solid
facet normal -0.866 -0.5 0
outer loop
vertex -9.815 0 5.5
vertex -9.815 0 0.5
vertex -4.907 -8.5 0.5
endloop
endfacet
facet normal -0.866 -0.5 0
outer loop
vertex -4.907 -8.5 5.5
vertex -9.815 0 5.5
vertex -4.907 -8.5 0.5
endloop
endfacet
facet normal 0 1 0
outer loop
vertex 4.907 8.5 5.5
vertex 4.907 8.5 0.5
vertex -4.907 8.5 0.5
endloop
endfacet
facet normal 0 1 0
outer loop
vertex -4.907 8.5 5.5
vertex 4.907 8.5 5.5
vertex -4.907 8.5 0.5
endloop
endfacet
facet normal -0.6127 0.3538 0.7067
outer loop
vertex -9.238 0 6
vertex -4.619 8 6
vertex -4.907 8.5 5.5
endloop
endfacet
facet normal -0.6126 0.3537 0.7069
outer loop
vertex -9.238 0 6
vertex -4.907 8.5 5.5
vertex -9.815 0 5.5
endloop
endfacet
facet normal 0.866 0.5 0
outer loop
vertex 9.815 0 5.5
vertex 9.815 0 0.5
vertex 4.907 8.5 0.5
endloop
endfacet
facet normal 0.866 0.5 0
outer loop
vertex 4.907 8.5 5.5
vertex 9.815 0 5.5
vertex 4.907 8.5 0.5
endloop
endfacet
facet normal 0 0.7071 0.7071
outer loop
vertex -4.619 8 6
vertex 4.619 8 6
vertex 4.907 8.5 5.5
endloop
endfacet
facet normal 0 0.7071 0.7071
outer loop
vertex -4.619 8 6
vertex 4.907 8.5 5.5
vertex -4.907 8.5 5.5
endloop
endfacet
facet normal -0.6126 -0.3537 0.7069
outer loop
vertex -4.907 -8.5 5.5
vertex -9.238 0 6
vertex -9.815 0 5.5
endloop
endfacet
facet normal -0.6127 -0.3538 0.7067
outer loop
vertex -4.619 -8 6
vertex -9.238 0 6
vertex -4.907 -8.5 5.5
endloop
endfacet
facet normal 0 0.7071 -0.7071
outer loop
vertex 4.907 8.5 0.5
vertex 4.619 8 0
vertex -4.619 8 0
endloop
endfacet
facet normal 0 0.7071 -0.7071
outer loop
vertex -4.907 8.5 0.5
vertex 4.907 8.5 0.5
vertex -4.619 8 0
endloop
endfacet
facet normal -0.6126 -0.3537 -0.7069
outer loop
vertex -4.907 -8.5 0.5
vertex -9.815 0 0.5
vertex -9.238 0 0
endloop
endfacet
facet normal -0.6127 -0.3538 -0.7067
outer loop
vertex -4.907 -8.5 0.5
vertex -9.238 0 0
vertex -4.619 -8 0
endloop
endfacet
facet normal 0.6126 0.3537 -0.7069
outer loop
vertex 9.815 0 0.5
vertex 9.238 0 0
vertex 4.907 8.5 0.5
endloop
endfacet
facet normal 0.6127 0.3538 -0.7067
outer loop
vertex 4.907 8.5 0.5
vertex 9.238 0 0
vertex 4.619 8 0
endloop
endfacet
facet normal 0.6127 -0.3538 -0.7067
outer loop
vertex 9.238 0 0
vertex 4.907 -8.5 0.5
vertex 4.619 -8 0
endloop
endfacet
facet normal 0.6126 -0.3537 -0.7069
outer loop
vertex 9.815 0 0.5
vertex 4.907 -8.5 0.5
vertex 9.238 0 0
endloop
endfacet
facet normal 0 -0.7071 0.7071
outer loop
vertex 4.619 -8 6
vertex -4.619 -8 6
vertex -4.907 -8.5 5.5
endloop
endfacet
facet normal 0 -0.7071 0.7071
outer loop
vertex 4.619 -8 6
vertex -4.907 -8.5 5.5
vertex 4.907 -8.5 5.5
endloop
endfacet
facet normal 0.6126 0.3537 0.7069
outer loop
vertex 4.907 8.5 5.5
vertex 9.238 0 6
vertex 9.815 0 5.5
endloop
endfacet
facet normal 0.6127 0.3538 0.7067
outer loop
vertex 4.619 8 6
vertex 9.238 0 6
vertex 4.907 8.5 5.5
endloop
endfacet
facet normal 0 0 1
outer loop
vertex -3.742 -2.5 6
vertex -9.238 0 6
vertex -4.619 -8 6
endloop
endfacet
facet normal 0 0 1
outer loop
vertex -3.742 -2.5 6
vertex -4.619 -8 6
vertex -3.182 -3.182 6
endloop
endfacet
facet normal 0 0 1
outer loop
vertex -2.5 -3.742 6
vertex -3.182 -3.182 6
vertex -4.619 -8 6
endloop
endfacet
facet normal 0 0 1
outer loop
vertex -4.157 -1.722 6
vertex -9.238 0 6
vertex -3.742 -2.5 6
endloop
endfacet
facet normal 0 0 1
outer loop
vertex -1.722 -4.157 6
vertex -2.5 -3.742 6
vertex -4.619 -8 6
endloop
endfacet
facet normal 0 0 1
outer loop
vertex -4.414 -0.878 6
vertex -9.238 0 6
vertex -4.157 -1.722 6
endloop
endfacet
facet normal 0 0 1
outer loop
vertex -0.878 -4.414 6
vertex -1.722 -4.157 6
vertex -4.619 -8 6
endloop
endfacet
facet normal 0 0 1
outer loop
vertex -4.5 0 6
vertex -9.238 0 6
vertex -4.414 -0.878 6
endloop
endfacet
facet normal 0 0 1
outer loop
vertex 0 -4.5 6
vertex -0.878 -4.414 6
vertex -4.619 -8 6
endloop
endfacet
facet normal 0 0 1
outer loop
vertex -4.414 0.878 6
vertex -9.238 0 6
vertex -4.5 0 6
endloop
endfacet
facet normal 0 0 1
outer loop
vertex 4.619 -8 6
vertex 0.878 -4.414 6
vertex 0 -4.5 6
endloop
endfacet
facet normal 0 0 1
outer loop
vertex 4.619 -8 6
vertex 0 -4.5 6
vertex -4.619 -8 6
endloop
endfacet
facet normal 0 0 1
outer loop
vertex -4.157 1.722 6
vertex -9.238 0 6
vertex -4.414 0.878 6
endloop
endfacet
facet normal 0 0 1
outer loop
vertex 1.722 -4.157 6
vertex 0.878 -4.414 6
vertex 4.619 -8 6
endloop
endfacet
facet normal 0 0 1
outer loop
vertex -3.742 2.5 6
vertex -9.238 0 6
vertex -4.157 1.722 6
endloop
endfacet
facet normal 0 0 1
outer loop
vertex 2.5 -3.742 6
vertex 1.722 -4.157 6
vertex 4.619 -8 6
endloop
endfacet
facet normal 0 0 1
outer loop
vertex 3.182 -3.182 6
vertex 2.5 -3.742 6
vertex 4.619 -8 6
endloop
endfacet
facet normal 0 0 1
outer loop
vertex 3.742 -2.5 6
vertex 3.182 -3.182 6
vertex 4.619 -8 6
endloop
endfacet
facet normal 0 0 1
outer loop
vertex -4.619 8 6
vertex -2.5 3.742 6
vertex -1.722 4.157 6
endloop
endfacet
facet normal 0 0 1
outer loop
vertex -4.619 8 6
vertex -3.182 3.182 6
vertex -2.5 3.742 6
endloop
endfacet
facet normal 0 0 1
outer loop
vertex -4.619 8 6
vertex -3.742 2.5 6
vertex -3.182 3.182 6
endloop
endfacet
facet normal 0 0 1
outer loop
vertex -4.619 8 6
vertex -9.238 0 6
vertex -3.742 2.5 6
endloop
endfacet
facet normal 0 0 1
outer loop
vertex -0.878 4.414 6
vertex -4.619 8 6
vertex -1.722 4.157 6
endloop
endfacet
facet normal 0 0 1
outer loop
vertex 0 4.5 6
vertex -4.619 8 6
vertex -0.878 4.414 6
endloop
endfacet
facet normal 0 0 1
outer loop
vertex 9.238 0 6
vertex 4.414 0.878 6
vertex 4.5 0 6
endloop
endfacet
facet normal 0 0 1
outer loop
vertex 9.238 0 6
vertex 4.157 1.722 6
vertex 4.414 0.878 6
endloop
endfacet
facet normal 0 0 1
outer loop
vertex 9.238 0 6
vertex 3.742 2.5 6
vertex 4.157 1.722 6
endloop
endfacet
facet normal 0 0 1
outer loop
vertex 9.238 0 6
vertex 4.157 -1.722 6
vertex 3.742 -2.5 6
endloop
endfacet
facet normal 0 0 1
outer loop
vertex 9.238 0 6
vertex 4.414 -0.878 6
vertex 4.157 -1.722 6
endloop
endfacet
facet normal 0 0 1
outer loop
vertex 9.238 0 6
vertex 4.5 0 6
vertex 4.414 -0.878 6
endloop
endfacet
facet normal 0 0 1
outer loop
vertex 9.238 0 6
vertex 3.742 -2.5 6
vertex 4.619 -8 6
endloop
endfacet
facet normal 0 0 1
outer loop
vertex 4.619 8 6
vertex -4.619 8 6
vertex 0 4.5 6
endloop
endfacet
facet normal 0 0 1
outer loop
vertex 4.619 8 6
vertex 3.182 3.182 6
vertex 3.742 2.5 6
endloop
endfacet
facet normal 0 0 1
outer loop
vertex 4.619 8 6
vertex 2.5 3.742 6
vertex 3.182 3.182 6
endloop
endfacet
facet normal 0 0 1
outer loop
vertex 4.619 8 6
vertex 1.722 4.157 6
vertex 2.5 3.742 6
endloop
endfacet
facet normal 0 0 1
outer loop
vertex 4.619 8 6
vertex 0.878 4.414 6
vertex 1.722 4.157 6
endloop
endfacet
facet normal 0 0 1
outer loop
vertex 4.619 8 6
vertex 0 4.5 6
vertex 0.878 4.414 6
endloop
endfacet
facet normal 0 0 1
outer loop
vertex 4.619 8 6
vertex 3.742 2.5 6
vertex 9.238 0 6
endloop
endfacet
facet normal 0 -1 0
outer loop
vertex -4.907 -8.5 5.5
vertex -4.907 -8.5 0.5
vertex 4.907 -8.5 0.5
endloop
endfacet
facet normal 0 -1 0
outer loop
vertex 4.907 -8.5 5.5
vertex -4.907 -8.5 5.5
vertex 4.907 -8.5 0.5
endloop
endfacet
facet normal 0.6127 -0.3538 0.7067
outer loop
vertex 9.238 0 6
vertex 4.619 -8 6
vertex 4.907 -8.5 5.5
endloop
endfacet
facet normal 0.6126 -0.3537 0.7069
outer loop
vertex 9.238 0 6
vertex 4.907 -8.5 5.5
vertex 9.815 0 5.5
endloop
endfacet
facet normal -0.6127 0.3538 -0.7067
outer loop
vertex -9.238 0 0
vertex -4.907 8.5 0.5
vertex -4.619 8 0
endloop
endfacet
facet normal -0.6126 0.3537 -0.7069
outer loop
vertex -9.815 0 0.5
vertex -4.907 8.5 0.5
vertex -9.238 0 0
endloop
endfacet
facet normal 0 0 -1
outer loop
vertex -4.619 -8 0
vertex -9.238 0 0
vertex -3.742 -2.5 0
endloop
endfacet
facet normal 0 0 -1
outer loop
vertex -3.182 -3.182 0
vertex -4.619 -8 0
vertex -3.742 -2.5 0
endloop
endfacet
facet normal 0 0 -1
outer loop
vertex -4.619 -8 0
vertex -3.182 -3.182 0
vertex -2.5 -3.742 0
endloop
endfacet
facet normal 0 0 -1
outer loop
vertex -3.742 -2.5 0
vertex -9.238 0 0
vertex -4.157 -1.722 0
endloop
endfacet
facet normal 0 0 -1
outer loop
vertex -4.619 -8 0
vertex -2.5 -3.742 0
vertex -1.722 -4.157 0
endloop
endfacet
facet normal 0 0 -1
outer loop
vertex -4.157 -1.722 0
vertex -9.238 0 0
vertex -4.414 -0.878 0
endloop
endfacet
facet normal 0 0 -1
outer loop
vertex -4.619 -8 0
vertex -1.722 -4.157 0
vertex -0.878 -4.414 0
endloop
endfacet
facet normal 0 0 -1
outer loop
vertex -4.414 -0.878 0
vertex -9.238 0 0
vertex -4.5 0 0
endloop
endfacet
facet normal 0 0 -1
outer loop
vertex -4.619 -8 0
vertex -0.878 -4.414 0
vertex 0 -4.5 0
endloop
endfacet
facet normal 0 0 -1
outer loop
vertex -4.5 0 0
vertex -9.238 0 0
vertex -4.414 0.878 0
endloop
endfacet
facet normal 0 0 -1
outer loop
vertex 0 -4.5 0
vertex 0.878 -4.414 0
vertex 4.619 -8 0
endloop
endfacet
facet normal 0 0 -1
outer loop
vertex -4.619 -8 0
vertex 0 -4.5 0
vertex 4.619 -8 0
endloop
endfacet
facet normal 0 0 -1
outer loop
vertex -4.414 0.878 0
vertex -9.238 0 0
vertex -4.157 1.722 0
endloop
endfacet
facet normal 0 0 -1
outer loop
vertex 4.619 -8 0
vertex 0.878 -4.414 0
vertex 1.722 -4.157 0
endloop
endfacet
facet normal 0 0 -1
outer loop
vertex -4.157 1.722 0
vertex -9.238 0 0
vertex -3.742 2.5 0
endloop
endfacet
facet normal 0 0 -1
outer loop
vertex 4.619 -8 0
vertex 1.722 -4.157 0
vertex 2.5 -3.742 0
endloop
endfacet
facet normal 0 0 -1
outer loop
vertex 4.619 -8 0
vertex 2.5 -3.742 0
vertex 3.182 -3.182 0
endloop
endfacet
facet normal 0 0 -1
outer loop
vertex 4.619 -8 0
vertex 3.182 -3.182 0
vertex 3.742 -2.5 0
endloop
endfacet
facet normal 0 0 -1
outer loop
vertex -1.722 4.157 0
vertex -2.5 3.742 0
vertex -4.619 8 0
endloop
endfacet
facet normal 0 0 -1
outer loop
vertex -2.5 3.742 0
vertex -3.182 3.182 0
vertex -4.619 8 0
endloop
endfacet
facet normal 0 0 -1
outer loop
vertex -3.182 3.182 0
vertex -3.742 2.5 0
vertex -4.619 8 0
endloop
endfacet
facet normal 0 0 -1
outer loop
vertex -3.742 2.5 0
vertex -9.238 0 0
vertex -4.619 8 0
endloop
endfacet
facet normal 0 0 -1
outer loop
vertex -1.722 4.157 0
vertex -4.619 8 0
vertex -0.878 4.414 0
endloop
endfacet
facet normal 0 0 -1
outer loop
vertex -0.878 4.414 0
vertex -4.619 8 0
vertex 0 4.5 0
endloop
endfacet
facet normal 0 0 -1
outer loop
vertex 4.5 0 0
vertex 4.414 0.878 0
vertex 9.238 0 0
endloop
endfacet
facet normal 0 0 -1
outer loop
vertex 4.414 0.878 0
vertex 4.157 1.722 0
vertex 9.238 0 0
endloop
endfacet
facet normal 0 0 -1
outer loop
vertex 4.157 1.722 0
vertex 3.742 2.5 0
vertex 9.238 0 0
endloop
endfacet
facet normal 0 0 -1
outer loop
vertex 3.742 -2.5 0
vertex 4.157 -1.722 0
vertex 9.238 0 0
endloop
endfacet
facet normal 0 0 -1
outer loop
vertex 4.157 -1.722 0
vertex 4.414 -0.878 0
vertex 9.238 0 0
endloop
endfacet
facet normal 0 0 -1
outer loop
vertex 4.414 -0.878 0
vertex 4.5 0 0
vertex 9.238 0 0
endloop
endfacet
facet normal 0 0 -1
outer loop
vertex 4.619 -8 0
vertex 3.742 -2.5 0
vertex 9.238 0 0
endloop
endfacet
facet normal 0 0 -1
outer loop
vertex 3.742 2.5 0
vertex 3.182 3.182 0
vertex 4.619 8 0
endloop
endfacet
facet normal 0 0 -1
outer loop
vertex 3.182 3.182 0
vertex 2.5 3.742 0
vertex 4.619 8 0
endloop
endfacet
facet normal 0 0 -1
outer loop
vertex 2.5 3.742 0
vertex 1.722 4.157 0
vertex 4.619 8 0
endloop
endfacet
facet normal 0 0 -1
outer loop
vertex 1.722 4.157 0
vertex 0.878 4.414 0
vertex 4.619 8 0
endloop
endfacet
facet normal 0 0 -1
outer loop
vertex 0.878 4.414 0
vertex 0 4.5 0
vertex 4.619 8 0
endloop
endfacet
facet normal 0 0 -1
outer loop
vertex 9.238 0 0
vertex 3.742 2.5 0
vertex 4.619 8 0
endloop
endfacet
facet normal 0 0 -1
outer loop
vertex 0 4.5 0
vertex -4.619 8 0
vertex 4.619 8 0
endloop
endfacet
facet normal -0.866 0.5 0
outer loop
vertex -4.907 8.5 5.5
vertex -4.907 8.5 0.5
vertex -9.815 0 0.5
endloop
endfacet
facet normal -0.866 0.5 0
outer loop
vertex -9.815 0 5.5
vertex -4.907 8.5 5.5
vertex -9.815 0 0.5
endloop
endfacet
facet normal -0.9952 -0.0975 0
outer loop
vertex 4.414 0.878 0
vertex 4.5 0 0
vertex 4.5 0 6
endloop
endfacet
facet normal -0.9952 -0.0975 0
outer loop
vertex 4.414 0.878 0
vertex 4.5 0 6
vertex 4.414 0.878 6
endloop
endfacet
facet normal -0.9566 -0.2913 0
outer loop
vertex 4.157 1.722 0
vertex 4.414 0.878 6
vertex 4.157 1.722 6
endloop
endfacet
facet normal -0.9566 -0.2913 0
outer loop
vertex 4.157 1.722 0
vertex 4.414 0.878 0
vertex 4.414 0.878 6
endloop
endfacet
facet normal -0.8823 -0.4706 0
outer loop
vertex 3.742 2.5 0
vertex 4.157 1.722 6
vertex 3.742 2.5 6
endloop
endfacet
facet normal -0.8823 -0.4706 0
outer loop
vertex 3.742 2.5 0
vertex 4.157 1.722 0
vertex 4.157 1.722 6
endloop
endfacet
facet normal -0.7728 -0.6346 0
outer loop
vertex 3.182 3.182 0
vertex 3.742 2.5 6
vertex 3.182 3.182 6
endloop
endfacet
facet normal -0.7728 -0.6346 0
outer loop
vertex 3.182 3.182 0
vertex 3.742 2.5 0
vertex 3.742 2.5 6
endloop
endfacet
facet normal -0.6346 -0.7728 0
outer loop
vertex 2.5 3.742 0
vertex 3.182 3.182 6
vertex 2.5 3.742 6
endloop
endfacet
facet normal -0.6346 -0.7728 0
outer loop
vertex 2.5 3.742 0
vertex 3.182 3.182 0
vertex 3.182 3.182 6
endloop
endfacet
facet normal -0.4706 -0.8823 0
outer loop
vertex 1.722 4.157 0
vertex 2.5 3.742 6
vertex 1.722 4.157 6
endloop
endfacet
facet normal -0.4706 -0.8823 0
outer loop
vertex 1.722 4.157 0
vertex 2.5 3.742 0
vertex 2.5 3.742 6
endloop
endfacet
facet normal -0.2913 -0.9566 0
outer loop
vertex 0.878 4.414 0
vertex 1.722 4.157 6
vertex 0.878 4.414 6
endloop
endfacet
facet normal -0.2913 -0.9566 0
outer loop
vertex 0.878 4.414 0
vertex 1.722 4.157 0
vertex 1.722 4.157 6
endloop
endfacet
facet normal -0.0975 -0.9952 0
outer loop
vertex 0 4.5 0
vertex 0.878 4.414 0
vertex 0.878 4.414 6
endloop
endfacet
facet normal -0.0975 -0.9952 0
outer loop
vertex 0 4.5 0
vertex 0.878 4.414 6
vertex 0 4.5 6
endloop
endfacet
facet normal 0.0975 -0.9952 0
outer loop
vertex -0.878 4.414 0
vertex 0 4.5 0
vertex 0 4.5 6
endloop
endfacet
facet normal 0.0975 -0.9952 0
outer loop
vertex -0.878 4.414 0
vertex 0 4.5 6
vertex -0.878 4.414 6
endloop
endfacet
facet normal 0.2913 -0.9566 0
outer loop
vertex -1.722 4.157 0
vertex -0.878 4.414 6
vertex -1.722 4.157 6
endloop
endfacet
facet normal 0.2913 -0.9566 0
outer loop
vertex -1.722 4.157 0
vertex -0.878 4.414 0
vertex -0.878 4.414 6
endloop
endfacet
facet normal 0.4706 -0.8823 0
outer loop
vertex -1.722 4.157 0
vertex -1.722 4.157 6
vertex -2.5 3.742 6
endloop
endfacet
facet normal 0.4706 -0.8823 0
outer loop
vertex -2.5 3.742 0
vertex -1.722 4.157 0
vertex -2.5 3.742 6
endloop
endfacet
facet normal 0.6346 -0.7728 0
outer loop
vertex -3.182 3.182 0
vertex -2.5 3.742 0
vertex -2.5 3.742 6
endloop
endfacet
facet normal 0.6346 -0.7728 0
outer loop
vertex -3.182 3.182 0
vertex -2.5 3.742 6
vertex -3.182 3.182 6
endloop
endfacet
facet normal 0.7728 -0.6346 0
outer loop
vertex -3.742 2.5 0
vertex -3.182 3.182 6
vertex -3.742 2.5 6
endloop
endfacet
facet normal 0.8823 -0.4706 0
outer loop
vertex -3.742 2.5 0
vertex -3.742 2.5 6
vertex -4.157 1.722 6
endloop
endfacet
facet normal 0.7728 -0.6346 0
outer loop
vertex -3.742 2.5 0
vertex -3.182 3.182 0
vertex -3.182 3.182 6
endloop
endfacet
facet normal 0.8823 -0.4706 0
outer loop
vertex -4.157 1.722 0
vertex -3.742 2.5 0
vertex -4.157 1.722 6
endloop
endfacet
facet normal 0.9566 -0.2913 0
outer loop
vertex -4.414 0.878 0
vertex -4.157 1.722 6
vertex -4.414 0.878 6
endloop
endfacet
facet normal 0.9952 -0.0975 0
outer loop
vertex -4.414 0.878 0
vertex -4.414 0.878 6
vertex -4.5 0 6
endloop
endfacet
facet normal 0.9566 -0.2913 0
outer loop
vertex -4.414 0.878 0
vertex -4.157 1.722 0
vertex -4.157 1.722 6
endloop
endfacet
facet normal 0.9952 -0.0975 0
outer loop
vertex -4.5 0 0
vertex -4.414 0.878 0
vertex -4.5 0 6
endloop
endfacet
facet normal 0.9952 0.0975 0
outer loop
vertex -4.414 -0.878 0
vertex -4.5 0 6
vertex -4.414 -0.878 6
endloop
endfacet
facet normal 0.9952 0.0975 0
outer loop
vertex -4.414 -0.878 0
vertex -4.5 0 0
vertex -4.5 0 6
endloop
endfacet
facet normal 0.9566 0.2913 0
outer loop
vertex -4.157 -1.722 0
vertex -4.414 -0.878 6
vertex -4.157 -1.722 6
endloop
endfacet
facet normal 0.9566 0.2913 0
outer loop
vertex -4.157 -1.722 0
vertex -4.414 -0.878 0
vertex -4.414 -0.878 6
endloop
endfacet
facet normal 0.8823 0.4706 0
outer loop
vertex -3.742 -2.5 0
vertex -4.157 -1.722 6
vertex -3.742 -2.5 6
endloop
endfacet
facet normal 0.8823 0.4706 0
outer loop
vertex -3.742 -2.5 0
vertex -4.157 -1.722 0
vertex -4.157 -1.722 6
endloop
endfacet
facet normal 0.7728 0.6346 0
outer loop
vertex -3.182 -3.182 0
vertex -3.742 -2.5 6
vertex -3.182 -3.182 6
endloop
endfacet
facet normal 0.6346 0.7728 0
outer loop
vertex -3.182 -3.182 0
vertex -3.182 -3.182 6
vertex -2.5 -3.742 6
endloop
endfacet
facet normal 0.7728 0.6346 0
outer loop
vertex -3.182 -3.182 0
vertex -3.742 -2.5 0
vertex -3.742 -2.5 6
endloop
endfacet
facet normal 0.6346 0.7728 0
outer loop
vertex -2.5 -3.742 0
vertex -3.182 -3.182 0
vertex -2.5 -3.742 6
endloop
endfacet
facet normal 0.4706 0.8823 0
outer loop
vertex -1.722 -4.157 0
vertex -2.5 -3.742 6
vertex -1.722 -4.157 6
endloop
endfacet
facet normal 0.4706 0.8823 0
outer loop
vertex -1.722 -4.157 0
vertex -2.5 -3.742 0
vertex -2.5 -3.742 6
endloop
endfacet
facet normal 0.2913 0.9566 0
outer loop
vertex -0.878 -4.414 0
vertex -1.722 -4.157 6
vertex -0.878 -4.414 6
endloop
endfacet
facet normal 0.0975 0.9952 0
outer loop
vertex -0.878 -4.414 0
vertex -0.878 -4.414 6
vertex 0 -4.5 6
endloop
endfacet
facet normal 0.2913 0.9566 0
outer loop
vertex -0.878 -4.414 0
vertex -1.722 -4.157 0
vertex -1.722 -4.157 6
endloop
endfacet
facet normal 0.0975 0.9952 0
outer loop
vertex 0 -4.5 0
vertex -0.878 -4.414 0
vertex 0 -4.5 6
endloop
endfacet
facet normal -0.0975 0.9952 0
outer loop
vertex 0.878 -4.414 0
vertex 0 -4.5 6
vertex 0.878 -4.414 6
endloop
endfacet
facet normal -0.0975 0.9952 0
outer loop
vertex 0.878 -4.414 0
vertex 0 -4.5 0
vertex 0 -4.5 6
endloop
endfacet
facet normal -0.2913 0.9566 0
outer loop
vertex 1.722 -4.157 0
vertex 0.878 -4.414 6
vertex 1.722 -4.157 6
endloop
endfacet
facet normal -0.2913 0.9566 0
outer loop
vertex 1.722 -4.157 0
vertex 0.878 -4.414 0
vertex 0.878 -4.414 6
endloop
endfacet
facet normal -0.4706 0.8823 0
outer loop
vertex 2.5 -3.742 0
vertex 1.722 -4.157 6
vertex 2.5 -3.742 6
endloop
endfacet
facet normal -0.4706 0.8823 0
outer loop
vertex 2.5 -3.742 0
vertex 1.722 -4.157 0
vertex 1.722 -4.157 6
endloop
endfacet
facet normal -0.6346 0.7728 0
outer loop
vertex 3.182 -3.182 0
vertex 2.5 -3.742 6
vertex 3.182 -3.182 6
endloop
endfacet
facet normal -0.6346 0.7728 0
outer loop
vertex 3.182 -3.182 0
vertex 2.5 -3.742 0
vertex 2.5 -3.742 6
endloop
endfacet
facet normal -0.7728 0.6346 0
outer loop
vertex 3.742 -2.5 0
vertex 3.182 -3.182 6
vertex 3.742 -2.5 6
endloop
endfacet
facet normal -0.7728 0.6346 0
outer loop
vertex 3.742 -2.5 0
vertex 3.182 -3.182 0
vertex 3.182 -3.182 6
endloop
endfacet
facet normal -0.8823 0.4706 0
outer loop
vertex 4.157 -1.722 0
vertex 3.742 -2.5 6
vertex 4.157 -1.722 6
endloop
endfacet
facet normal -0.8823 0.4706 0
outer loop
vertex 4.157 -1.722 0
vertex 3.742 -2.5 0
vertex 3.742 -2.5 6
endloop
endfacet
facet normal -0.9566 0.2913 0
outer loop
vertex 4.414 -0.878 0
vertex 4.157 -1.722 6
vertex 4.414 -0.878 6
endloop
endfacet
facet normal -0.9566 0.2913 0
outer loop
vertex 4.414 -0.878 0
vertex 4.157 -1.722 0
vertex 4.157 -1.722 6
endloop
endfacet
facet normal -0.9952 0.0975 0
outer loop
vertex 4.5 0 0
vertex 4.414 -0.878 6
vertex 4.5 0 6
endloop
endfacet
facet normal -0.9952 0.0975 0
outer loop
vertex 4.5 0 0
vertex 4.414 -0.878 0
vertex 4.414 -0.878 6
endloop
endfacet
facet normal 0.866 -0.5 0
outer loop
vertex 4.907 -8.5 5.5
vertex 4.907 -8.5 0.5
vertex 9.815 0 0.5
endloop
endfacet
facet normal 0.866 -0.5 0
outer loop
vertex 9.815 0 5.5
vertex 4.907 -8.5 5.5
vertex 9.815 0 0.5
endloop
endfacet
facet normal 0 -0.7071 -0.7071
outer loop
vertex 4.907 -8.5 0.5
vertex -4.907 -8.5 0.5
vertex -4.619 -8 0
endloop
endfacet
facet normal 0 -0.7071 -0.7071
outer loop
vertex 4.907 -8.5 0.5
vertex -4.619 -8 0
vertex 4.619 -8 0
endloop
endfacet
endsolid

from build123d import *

# Parameters (mm, degrees)
SKETCH_R        = 4.5
PAD_DEPTH       = 6
CHAMFER_SIZE    = 0.5
CHAMFER001_SIZE = 0.5


with BuildPart() as part:
    # Sketch → Pad (new body)
    with BuildSketch(Plane.XY):
        Polygon((4.907477, 8.5), (-4.907477, 8.5), (-9.814955, 0), (-4.907477, -8.5), (4.907477, -8.5), (9.814955, 0), align=None)
        Circle(SKETCH_R, mode=Mode.SUBTRACT)
    extrude(amount=PAD_DEPTH)

    # Chamfer
    chamfer_edges = [part.edges().sort_by_distance(p)[0] for p in [
        (0, -8.5, 6),
        (-7.361216, -4.25, 6),
        (-7.361216, 4.25, 6),
        (0, 8.5, 6),
        (7.361216, 4.25, 6),
        (7.361216, -4.25, 6),
    ]]
    chamfer(chamfer_edges, length=CHAMFER_SIZE)

    # Chamfer001
    chamfer001_edges = [part.edges().sort_by_distance(p)[0] for p in [
        (7.361216, -4.25, 0),
        (0, -8.5, 0),
        (-7.361216, -4.25, 0),
        (-7.361216, 4.25, 0),
        (0, 8.5, 0),
        (7.361216, 4.25, 0),
    ]]
    chamfer(chamfer001_edges, length=CHAMFER001_SIZE)


solid = part.part
